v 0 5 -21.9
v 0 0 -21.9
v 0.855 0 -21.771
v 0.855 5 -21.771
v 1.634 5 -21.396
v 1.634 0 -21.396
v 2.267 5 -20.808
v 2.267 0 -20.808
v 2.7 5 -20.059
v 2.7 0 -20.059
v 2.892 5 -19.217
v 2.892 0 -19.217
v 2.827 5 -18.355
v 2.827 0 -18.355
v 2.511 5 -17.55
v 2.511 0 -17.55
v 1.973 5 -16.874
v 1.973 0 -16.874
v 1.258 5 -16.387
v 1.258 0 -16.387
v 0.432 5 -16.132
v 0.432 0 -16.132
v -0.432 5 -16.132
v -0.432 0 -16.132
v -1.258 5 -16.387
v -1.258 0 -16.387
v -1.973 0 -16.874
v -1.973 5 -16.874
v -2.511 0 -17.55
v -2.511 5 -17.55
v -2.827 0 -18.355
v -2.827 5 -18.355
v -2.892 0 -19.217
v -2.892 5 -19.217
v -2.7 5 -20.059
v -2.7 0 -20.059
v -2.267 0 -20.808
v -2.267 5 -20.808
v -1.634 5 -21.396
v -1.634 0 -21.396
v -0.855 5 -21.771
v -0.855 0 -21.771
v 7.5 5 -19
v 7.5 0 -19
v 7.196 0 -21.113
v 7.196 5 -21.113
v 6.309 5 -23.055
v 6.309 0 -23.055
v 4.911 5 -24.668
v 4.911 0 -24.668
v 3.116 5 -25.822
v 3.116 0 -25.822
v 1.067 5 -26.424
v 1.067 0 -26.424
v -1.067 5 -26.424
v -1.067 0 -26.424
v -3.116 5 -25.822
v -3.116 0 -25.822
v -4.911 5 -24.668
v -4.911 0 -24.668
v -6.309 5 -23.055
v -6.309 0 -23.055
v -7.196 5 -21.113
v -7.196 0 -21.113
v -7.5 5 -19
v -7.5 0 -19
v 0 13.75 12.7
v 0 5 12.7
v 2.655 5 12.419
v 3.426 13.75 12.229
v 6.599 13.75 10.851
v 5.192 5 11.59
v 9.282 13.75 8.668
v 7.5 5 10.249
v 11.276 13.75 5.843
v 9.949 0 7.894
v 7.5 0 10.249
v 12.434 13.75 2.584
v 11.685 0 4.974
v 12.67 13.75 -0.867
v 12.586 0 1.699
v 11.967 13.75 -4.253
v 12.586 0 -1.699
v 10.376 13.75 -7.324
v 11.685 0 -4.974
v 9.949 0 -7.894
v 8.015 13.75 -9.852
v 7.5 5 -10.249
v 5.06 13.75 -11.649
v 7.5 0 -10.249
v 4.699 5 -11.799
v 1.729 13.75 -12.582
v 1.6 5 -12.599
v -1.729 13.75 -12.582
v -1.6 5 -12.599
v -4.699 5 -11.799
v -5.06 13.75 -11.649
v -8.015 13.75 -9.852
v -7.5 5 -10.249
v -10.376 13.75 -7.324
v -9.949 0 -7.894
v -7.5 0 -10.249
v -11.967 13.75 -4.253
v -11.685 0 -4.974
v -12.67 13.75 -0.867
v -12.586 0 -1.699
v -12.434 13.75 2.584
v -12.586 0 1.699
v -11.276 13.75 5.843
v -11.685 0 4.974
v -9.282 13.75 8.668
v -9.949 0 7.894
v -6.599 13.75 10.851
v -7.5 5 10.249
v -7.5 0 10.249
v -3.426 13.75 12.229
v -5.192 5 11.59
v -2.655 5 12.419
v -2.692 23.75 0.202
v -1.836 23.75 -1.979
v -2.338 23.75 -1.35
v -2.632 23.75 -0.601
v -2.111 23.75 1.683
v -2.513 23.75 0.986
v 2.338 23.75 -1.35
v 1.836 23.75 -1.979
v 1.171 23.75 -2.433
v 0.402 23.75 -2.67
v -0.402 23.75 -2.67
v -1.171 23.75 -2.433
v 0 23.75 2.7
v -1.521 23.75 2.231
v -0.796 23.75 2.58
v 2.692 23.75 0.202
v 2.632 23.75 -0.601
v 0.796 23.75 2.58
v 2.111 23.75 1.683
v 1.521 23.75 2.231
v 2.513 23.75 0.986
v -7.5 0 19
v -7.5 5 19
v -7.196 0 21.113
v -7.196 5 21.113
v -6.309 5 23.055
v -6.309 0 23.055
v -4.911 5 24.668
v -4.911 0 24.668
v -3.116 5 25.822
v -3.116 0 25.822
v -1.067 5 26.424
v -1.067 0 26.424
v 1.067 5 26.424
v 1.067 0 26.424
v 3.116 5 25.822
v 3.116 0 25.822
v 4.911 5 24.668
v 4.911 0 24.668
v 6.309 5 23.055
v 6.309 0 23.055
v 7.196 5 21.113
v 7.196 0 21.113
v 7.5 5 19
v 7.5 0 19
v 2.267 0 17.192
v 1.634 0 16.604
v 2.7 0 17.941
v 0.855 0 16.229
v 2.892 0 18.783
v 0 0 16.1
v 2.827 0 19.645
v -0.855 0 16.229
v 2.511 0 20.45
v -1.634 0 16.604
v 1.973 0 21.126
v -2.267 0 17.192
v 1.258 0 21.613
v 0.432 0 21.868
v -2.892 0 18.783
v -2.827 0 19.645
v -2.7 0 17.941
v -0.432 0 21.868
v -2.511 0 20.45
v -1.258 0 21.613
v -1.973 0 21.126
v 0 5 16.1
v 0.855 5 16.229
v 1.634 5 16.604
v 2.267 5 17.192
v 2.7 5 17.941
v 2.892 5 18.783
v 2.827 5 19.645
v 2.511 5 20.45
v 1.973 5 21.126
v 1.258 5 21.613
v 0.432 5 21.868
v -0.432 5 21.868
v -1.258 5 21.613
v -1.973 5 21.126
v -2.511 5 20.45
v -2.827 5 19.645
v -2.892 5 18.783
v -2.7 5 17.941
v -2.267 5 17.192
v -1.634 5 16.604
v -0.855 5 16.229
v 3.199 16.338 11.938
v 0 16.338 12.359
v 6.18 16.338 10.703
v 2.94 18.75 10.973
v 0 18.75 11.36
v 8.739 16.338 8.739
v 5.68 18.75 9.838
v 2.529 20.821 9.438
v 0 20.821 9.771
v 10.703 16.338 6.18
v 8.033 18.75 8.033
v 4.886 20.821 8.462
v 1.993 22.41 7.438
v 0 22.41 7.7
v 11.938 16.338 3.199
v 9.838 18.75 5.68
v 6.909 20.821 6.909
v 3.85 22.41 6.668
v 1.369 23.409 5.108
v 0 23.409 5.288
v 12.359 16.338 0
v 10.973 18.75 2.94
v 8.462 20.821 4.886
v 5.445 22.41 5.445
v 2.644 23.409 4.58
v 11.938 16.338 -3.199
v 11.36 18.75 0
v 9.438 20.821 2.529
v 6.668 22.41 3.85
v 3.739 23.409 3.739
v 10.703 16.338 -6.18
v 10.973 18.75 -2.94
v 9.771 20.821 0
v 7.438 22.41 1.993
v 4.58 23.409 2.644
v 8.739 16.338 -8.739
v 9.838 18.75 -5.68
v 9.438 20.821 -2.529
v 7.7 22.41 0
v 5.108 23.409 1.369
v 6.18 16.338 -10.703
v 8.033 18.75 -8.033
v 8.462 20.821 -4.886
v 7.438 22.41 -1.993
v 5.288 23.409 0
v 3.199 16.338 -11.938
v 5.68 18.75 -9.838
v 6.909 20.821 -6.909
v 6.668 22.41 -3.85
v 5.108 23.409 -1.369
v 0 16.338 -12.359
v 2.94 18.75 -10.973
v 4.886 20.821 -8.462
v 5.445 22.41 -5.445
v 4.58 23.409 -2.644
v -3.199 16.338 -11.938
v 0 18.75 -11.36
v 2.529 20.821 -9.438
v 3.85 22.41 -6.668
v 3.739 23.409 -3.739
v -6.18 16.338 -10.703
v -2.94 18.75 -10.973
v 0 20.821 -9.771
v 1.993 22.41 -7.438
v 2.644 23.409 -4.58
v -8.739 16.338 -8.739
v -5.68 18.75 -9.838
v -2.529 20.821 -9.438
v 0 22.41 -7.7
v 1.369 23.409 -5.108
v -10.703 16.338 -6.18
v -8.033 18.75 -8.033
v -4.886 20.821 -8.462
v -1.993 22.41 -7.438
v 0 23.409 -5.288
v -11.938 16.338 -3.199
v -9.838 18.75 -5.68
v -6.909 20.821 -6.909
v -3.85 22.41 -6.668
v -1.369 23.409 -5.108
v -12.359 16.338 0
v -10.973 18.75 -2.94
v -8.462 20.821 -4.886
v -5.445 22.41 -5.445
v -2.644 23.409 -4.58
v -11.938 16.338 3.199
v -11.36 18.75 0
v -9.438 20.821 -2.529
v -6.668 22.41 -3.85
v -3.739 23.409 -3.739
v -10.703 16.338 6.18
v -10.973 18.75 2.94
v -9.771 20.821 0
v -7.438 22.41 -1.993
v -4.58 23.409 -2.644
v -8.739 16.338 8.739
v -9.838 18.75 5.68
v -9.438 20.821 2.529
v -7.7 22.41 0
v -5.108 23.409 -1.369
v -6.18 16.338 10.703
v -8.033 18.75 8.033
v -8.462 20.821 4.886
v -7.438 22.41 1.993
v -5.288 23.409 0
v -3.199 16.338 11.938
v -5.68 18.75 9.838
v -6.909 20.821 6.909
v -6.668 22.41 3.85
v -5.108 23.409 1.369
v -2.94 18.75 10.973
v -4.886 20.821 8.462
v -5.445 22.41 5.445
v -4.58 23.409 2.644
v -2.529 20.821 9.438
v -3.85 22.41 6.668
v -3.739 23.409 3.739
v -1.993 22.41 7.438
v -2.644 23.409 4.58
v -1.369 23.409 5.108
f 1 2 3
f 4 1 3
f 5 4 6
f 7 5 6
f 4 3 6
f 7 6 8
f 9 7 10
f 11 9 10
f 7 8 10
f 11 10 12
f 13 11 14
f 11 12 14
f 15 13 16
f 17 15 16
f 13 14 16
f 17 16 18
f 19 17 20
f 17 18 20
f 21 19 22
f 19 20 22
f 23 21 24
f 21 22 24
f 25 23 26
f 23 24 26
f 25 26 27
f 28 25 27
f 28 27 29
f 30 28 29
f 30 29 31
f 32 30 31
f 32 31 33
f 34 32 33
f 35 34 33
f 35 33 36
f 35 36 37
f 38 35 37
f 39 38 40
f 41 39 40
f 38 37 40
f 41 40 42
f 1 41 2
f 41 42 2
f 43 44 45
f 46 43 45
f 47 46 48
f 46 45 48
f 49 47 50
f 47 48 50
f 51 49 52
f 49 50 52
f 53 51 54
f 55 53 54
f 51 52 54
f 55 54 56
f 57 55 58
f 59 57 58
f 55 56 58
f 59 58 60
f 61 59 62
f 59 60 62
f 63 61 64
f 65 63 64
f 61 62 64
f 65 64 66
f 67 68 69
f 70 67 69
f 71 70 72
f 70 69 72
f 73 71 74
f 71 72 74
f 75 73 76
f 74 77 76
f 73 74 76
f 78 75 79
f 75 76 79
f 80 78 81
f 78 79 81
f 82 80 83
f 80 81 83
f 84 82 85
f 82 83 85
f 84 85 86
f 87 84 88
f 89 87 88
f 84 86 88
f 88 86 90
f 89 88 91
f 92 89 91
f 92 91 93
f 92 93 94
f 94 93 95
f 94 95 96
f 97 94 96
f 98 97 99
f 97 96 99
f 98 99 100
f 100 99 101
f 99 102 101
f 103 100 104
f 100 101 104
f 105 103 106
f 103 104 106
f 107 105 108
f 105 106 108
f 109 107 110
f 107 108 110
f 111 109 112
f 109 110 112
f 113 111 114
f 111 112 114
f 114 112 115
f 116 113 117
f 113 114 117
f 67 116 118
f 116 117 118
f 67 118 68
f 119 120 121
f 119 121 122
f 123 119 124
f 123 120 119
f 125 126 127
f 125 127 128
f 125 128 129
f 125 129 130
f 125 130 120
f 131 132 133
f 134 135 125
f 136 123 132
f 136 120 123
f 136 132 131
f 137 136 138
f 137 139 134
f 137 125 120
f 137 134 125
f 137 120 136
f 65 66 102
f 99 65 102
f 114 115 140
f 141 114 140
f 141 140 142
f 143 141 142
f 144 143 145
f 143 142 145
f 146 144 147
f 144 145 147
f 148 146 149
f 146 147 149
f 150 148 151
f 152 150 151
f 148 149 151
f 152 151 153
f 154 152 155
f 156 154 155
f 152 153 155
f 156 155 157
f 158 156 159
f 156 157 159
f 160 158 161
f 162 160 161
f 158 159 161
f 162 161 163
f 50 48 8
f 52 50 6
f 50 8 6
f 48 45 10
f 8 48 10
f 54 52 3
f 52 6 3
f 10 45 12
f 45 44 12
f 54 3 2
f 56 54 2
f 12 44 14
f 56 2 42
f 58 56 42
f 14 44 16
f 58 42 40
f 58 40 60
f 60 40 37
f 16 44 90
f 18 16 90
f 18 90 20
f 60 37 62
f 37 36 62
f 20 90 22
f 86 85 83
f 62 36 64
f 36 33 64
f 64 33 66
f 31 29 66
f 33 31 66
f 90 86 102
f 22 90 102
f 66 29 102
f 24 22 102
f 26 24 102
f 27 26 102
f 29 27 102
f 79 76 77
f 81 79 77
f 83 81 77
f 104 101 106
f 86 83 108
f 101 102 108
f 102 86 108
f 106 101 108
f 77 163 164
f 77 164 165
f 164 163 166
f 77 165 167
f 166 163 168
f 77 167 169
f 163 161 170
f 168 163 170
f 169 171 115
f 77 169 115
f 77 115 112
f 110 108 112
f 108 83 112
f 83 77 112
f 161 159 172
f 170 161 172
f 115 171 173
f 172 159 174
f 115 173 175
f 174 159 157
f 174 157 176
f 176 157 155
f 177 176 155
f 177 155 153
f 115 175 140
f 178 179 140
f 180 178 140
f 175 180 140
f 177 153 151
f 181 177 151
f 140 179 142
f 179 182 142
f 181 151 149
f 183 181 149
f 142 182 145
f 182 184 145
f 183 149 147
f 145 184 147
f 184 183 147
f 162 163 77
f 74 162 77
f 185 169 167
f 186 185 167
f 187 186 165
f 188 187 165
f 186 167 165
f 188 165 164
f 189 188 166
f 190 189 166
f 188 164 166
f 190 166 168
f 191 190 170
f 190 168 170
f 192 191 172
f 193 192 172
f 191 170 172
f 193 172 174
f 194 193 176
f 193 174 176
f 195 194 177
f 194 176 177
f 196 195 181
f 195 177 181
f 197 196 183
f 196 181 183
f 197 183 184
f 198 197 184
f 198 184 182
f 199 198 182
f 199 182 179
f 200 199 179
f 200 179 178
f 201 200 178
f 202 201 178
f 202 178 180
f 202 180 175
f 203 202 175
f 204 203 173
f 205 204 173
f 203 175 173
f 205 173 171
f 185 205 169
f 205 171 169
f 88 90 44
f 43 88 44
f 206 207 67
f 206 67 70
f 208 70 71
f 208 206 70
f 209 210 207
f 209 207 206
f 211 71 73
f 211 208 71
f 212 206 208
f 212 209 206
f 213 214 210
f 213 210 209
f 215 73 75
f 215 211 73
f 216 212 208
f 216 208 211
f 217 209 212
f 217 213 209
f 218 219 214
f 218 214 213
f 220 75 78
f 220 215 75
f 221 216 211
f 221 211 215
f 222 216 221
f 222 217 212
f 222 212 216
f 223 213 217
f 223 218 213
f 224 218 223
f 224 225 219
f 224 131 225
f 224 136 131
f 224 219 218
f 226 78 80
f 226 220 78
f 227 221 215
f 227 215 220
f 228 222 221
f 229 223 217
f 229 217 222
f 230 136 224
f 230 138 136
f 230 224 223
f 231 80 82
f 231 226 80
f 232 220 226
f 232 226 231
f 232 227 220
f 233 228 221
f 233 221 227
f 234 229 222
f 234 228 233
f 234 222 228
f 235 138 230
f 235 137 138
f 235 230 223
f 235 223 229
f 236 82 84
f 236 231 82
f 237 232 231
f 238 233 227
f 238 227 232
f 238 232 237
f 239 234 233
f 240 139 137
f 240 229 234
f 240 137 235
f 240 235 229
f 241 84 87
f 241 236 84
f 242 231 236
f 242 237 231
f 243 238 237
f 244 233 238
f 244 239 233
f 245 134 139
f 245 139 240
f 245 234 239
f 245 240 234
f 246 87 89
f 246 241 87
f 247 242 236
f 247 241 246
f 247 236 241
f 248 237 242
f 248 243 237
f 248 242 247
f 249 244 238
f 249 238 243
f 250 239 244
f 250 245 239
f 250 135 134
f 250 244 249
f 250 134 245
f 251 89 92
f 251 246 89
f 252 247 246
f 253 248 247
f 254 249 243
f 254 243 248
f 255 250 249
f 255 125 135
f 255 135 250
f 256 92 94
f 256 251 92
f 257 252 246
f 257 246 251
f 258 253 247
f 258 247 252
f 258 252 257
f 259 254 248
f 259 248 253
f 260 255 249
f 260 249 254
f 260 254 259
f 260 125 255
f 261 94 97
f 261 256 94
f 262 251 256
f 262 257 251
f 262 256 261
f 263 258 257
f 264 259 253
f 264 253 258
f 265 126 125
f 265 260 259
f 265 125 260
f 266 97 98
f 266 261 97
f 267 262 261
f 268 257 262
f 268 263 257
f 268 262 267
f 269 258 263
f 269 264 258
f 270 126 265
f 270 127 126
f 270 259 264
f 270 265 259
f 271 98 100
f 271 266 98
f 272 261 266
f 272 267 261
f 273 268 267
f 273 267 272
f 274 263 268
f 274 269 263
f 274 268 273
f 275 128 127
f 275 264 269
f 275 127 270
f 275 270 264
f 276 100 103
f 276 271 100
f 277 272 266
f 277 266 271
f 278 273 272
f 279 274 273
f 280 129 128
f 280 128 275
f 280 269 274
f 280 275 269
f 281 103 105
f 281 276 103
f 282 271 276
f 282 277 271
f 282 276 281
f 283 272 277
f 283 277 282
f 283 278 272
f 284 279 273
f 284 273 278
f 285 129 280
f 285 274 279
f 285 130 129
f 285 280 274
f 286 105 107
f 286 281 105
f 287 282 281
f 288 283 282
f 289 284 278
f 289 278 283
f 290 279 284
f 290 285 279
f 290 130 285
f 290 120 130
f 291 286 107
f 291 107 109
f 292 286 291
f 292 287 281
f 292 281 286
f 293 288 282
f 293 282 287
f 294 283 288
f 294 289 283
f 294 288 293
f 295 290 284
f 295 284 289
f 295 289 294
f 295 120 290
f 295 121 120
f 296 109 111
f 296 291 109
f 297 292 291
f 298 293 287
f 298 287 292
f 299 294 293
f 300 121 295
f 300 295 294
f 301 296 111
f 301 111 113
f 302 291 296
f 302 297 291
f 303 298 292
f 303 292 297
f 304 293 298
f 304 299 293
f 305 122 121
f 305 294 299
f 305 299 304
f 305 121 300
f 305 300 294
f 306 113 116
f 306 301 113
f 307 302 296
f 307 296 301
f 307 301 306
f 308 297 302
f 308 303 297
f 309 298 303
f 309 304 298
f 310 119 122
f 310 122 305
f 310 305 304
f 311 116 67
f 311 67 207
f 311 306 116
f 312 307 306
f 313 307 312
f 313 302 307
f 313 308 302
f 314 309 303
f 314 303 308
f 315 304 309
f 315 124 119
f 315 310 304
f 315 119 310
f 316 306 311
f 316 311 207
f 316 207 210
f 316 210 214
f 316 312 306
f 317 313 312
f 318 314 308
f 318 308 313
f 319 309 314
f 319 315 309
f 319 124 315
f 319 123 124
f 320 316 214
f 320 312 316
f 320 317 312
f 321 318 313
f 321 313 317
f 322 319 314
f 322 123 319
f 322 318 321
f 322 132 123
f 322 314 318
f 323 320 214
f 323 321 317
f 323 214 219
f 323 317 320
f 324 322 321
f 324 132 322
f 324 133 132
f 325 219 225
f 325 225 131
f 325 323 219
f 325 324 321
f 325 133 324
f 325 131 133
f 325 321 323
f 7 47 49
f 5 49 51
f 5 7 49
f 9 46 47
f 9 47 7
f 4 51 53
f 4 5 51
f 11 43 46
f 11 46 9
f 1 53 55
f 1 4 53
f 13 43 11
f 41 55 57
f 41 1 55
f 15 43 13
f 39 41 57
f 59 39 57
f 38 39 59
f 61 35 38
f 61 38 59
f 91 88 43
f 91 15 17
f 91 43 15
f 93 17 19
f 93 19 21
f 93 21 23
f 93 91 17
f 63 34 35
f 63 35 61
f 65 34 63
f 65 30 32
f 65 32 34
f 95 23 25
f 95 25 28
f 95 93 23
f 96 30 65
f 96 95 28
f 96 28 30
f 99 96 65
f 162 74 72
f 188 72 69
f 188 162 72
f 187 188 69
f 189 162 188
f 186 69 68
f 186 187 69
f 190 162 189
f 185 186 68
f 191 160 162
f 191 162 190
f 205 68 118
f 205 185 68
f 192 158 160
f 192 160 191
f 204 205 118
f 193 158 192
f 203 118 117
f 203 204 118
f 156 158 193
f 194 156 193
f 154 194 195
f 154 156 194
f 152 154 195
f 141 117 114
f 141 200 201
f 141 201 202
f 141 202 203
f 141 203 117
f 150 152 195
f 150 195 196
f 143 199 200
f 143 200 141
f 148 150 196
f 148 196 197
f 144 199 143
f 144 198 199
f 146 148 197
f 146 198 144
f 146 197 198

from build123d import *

# Parameters (mm, degrees)
SKETCH1_R           = 12.7
BOSS_EXTRUDE1_DEPTH = 23.75
FILLET1_R           = 10
SKETCH2_R           = 2.9
BOSS_EXTRUDE2_DEPTH = 5


with BuildPart() as part:
    # Sketch1 → Boss-Extrude1 (new body)
    with BuildSketch(Plane(origin=(0, 0, 0), x_dir=(1, 0, 0), z_dir=(0, 1, 0))):
        with Locations(Location((0, 0, 0), (0, 0, 270))):
            Circle(SKETCH1_R)
    extrude(amount=BOSS_EXTRUDE1_DEPTH)

    # Fillet1
    fillet1_edges = [part.edges().sort_by_distance(p)[0] for p in [
        (0, 23.75, -12.7),
    ]]
    fillet(fillet1_edges, radius=FILLET1_R)

    # Sketch2 → Boss-Extrude2 (add)
    with BuildSketch(Plane.XZ):
        with BuildLine():
            Line((7.5, 19), (7.5, -19))
            ThreePointArc((7.5, -19), (0, -26.5), (-7.5, -19))
            Line((-7.5, -19), (-7.5, 19))
            ThreePointArc((-7.5, 19), (0, 26.5), (7.5, 19))
        make_face()
        with Locations(Location((0, 19, 0), (0, 0, 270))):
            Circle(SKETCH2_R, mode=Mode.SUBTRACT)
        with Locations(Location((0, -19, 0), (0, 0, 270))):
            Circle(SKETCH2_R, mode=Mode.SUBTRACT)
    extrude(amount=-BOSS_EXTRUDE2_DEPTH)


solid = part.part
